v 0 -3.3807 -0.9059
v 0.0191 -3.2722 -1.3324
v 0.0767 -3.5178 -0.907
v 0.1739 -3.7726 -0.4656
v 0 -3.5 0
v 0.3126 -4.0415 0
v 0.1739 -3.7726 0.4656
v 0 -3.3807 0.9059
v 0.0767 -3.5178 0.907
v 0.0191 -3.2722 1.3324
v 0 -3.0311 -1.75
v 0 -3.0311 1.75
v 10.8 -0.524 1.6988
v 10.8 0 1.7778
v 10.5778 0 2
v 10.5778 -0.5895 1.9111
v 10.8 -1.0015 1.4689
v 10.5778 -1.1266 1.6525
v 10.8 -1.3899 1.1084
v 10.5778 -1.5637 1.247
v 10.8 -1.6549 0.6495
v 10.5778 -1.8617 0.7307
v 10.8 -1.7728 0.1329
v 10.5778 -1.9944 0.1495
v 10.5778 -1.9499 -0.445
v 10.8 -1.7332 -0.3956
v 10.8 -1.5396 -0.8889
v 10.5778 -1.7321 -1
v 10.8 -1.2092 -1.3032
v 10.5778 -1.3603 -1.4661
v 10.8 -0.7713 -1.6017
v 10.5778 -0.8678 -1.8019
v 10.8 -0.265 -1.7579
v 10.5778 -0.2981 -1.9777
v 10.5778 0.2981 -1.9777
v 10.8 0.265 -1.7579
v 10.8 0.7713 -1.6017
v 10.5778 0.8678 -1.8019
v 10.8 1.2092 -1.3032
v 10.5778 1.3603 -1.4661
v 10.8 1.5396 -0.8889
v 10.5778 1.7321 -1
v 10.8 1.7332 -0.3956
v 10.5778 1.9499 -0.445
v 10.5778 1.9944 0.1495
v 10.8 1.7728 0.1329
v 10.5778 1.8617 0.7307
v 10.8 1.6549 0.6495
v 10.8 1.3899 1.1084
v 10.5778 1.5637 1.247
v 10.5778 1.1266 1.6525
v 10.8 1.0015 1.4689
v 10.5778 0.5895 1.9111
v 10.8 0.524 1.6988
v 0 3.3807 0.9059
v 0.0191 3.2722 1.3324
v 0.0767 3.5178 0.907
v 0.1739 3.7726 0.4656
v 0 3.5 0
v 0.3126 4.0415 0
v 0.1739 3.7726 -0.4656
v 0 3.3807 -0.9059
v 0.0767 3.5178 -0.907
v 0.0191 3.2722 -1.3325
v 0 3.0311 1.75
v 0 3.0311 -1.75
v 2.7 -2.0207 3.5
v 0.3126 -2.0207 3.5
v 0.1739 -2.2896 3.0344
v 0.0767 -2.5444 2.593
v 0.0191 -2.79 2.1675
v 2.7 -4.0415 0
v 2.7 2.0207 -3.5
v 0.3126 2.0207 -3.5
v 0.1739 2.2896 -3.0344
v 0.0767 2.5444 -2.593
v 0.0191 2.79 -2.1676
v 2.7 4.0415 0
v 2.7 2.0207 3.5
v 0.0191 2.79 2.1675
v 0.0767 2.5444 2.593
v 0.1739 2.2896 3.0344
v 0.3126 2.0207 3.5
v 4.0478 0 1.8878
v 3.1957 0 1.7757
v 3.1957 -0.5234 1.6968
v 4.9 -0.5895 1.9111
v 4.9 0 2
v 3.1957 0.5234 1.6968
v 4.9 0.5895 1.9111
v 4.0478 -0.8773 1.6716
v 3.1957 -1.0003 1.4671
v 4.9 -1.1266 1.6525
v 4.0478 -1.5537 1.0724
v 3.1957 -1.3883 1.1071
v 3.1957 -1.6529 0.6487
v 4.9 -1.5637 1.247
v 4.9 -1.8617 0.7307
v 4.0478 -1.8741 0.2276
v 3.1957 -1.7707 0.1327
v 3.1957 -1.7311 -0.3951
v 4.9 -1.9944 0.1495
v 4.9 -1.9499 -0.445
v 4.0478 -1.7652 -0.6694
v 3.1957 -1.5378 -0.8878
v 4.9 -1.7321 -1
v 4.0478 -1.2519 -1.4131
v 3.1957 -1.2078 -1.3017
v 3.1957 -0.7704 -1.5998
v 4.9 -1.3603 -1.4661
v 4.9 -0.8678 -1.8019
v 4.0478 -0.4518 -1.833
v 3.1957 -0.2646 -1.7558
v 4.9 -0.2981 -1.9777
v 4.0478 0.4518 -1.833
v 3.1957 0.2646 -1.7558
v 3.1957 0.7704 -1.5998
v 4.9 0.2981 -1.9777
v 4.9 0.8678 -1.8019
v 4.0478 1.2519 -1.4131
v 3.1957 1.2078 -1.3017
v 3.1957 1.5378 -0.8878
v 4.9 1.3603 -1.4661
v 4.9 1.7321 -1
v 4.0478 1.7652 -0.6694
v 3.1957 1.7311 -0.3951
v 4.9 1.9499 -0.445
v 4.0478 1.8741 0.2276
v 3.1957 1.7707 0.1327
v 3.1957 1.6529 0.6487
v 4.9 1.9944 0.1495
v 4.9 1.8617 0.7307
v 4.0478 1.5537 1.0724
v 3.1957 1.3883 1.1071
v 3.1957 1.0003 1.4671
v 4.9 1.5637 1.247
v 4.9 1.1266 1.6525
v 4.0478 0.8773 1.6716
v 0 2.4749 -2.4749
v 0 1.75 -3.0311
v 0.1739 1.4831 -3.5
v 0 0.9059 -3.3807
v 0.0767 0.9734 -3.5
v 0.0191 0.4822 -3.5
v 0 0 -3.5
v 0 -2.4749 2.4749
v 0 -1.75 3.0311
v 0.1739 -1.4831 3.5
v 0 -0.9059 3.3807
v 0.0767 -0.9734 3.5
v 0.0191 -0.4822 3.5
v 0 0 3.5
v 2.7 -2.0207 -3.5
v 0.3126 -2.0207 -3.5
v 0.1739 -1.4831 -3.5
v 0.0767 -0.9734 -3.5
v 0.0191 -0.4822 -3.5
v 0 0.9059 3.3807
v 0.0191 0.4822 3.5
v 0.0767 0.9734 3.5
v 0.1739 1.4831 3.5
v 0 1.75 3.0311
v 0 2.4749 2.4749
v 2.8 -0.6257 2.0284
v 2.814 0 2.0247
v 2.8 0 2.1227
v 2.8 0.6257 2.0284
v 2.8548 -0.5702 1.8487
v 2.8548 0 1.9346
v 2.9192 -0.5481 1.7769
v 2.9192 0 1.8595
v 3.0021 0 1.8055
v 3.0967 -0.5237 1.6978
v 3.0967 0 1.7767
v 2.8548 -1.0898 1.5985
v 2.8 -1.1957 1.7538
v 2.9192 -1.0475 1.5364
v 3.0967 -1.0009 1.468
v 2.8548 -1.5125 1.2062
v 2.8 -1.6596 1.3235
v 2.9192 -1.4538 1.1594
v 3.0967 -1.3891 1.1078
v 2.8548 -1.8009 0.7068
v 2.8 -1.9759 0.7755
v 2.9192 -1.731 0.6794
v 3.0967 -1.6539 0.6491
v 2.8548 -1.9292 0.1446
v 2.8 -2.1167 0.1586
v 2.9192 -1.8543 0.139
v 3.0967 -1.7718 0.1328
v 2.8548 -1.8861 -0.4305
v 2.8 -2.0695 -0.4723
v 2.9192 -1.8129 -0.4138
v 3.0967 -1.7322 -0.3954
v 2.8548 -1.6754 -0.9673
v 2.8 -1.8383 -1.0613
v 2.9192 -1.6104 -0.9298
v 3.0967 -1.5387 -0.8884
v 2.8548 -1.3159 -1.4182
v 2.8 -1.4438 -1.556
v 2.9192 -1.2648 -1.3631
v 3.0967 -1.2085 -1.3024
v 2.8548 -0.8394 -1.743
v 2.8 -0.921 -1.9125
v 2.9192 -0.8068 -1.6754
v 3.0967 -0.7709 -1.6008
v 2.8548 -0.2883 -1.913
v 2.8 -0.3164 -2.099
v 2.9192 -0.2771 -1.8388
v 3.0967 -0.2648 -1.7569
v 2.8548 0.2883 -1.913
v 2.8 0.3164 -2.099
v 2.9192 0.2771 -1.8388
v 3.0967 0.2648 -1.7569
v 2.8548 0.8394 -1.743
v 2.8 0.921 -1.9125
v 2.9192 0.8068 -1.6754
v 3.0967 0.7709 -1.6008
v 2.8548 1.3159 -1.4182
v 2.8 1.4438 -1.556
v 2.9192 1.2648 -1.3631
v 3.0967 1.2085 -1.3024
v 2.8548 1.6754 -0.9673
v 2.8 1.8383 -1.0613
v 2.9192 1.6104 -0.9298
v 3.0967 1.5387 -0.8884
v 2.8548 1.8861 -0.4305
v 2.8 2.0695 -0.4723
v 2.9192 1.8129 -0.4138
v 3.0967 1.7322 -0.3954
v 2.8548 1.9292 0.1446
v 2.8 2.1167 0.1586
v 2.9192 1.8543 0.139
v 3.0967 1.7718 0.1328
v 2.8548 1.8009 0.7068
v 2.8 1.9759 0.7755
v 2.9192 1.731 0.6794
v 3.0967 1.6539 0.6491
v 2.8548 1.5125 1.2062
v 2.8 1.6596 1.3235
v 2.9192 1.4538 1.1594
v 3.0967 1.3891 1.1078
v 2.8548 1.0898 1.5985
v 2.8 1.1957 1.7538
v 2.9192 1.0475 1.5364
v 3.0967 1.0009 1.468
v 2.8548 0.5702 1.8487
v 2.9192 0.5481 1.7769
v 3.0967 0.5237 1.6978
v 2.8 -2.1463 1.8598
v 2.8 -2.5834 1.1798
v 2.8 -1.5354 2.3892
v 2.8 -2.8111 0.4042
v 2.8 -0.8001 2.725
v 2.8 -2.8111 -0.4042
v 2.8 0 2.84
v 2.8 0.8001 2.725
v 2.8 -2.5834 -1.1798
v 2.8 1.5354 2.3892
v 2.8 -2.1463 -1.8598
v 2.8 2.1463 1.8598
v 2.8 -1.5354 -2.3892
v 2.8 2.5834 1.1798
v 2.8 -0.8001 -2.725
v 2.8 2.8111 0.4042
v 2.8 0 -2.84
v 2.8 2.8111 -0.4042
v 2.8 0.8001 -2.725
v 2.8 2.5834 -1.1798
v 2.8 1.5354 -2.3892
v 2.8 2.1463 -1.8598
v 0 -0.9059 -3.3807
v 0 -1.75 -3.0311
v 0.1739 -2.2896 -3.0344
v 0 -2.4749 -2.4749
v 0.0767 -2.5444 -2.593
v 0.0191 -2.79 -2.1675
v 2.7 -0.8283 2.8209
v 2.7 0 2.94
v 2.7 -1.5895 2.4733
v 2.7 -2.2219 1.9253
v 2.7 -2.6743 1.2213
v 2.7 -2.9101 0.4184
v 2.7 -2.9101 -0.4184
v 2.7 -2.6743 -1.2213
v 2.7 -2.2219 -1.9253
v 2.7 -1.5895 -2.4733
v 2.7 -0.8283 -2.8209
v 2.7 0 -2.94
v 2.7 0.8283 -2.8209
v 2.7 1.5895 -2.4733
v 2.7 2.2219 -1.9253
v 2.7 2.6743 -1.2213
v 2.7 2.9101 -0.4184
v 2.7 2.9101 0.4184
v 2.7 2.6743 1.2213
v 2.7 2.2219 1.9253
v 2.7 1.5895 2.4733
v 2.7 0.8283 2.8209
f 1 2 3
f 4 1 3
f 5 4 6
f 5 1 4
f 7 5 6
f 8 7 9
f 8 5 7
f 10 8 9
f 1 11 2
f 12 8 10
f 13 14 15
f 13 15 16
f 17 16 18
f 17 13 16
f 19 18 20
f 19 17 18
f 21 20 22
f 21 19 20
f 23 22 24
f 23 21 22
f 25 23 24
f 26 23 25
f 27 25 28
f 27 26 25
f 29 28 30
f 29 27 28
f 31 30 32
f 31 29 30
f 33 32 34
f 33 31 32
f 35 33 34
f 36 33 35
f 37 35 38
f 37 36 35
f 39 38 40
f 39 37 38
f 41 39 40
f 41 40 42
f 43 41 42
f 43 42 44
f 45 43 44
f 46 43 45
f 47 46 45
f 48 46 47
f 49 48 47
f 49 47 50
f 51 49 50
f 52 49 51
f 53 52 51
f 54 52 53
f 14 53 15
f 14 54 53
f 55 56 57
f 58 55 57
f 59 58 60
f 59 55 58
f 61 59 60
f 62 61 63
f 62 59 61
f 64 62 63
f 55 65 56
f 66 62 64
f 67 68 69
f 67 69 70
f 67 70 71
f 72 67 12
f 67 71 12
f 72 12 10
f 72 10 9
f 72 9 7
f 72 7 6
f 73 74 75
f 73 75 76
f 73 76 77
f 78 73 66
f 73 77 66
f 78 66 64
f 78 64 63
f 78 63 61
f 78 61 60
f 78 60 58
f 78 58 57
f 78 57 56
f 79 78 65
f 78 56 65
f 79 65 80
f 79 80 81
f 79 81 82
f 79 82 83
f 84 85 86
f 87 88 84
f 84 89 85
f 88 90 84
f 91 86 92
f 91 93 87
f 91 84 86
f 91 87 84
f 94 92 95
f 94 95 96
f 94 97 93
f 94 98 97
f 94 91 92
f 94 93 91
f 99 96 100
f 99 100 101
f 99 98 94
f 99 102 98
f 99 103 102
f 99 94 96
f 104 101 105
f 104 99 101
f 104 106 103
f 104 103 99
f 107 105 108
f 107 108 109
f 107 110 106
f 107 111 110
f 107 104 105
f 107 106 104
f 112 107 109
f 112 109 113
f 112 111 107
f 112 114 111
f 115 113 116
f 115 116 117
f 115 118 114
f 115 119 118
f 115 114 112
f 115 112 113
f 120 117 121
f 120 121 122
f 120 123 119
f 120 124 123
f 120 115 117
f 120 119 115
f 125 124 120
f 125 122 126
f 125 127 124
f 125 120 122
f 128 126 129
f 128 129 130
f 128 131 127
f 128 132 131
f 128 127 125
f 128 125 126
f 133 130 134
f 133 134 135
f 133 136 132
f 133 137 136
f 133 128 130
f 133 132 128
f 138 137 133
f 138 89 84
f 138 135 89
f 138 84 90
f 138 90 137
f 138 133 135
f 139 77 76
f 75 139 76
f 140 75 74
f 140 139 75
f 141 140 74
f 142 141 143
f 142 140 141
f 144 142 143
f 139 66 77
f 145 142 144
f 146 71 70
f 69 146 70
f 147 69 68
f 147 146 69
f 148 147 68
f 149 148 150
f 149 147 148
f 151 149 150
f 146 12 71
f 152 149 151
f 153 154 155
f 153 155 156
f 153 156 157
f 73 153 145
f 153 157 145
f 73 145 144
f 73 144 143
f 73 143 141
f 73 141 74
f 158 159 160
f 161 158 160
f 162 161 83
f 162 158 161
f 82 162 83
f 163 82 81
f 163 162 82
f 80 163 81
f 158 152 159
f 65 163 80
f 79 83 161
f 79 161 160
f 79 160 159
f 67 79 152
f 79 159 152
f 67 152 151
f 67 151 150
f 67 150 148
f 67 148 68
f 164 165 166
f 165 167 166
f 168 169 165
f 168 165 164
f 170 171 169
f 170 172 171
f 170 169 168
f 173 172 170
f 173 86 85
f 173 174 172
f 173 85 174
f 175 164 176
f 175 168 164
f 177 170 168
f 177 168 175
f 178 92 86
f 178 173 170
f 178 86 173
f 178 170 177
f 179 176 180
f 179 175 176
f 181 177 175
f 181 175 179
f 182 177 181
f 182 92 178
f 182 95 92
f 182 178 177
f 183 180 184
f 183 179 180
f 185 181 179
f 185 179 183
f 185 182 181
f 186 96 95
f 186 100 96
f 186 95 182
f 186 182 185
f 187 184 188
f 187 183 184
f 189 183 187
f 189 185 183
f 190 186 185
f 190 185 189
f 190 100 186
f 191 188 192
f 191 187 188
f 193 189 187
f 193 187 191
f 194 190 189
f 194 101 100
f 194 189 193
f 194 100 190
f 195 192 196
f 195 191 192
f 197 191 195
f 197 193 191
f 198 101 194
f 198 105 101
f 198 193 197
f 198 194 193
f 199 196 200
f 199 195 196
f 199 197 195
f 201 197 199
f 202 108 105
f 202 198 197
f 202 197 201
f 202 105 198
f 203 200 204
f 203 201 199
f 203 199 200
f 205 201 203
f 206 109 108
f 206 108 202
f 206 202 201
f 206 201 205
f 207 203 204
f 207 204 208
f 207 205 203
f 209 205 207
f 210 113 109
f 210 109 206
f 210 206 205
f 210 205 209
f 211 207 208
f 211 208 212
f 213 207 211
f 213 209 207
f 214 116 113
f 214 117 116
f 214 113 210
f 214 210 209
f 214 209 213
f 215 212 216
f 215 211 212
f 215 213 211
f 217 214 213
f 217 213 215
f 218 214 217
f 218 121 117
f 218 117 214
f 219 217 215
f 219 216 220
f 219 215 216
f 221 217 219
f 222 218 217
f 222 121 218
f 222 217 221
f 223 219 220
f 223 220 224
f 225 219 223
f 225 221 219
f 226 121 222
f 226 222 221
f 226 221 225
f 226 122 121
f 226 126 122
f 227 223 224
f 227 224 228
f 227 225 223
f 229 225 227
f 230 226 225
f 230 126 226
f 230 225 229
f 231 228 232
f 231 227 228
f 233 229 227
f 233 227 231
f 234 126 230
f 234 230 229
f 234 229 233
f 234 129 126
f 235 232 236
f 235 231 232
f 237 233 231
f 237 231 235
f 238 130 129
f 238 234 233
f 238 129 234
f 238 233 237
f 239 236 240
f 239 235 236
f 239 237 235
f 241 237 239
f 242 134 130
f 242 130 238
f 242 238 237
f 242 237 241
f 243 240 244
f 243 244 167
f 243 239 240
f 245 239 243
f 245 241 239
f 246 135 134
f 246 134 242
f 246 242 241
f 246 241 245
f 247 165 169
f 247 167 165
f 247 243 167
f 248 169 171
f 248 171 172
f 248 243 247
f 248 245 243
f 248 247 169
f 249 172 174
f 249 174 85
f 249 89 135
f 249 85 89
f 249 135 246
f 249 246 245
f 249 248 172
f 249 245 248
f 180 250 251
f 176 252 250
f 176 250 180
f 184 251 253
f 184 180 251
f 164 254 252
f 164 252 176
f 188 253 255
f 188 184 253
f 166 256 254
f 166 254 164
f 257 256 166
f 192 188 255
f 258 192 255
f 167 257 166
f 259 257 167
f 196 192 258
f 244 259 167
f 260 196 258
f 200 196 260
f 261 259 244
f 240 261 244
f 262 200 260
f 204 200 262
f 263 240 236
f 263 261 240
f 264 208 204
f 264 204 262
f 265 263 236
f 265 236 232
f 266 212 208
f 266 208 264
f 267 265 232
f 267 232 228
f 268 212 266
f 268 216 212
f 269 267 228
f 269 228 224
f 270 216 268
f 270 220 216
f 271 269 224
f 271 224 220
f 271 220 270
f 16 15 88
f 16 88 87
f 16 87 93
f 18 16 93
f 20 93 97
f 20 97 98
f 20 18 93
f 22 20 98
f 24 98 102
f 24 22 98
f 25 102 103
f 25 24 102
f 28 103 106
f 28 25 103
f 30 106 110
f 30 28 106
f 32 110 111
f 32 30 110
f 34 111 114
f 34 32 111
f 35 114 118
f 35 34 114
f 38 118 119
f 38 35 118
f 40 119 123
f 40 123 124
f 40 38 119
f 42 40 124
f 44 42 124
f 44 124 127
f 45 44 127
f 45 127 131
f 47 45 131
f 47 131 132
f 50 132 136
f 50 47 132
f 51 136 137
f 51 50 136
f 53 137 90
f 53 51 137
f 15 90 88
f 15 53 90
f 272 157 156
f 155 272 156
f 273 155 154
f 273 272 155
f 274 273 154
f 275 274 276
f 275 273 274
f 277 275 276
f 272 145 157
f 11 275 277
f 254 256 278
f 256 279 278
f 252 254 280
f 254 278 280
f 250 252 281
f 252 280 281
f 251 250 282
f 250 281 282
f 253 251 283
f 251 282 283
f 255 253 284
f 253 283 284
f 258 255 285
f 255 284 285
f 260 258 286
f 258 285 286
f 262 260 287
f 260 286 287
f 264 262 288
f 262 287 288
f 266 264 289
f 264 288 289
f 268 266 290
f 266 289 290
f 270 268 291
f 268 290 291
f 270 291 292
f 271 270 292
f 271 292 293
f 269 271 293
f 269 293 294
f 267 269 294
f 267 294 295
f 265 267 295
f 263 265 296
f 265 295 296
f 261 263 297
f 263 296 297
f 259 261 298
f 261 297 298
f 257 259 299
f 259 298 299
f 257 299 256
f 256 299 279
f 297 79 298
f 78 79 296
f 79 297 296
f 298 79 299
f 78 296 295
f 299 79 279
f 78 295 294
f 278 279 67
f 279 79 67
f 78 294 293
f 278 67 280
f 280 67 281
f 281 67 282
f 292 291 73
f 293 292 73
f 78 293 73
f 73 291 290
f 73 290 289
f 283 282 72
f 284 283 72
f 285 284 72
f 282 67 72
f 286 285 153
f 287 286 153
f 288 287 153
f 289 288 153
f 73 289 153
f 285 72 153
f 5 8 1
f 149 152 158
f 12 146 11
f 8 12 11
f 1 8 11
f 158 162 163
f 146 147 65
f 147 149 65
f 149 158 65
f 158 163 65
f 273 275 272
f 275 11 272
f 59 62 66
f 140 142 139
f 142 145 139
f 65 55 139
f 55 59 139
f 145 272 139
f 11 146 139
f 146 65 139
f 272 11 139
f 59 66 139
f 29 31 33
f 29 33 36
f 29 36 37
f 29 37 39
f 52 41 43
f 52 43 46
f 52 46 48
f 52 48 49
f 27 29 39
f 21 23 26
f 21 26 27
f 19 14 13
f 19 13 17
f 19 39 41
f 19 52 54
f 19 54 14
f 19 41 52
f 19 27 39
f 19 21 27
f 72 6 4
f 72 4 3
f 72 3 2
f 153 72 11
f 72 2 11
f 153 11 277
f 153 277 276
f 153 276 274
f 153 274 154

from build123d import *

# Parameters (mm, degrees)
EXTRUDE_1_DEPTH     = 2.8
SKETCH_4_R          = 7.66
SKETCH_4_R_2        = 3.5
CUT_EXTRUDE_1_DEPTH = 0.35
CUT_EXTRUDE_1_DRAFT = -60
CHAMFER_1_SIZE      = 0.222222222


with BuildPart() as part:
    # 草图3 → 凸台-拉伸1 (new body)
    with BuildSketch(Plane(origin=(0, 0, 0), x_dir=(0, 0, -1), z_dir=(1, 0, 0))):
        Polygon((3.5, 2.020725942), (0, 4.041451884), (-3.5, 2.020725942), (-3.5, -2.020725942), (0, -4.041451884), (3.5, -2.020725942), align=None)
    extrude(amount=EXTRUDE_1_DEPTH)


with BuildPart() as cut_extrude_1_tool:
    # 草图4 → 切除-拉伸1 (with draft: the straight prism first)
    with BuildSketch(Plane.ZY):
        Circle(SKETCH_4_R)
        Circle(SKETCH_4_R_2, mode=Mode.SUBTRACT)
    extrude(amount=-CUT_EXTRUDE_1_DEPTH)
    # 切除-拉伸1: the draft: its side faces are tilted about the plane it starts from
    cut_extrude_1_sides = [cut_extrude_1_tool.faces().sort_by_distance(p)[0] for p in [
        (0.175, 0, -7.66),
        (0.175, 0, -3.5),
    ]]
    draft(cut_extrude_1_sides, Plane.ZY, CUT_EXTRUDE_1_DRAFT)


with BuildPart() as part_1:
    add(part.part)

    # 切除-拉伸1: cut by cut_extrude_1_tool
    add(cut_extrude_1_tool.part, mode=Mode.SUBTRACT)

    # 草图6 → 旋转2 (revolve)
    with BuildSketch(Plane.XY, mode=Mode.PRIVATE) as revolve_2_sk:
        with BuildLine():
            Line((4.9, 2), (10.8, 2))
            Line((10.8, 2), (10.8, 0))
            Line((10.8, 0), (2.8, 0))
            Line((2.8, 0), (2.8, 2.122675))
            ThreePointArc((2.8, 2.122675), (2.919225418, 1.859534178), (3.195674814, 1.775668067))
            Line((3.195674814, 1.775668067), (4.9, 2))
        make_face()
    revolve(revolve_2_sk.sketch.rotate(Axis((2.8, 0, 0), (1, 0, 0)), 90), axis=Axis((2.8, 0, 0), (1, 0, 0)))

    # 倒角1
    chamfer_1_edges = [part_1.edges().sort_by_distance(p)[0] for p in [
        (10.8, 0, -2),
    ]]
    chamfer(chamfer_1_edges, length=CHAMFER_1_SIZE)

    # 草图8 → 切除-旋转2 (revolve, cut)
    with BuildSketch(Plane.XY, mode=Mode.PRIVATE) as cut_revolve_2_sk:
        Polygon((2.8, 2.84), (2.7, 2.94), (2.7, 7.66), (2.8, 7.66), align=None)
    revolve(cut_revolve_2_sk.sketch.rotate(Axis((0, 0, 0), (1, 0, 0)), 90), axis=Axis((0, 0, 0), (1, 0, 0)), mode=Mode.SUBTRACT)


solid = part_1.part
